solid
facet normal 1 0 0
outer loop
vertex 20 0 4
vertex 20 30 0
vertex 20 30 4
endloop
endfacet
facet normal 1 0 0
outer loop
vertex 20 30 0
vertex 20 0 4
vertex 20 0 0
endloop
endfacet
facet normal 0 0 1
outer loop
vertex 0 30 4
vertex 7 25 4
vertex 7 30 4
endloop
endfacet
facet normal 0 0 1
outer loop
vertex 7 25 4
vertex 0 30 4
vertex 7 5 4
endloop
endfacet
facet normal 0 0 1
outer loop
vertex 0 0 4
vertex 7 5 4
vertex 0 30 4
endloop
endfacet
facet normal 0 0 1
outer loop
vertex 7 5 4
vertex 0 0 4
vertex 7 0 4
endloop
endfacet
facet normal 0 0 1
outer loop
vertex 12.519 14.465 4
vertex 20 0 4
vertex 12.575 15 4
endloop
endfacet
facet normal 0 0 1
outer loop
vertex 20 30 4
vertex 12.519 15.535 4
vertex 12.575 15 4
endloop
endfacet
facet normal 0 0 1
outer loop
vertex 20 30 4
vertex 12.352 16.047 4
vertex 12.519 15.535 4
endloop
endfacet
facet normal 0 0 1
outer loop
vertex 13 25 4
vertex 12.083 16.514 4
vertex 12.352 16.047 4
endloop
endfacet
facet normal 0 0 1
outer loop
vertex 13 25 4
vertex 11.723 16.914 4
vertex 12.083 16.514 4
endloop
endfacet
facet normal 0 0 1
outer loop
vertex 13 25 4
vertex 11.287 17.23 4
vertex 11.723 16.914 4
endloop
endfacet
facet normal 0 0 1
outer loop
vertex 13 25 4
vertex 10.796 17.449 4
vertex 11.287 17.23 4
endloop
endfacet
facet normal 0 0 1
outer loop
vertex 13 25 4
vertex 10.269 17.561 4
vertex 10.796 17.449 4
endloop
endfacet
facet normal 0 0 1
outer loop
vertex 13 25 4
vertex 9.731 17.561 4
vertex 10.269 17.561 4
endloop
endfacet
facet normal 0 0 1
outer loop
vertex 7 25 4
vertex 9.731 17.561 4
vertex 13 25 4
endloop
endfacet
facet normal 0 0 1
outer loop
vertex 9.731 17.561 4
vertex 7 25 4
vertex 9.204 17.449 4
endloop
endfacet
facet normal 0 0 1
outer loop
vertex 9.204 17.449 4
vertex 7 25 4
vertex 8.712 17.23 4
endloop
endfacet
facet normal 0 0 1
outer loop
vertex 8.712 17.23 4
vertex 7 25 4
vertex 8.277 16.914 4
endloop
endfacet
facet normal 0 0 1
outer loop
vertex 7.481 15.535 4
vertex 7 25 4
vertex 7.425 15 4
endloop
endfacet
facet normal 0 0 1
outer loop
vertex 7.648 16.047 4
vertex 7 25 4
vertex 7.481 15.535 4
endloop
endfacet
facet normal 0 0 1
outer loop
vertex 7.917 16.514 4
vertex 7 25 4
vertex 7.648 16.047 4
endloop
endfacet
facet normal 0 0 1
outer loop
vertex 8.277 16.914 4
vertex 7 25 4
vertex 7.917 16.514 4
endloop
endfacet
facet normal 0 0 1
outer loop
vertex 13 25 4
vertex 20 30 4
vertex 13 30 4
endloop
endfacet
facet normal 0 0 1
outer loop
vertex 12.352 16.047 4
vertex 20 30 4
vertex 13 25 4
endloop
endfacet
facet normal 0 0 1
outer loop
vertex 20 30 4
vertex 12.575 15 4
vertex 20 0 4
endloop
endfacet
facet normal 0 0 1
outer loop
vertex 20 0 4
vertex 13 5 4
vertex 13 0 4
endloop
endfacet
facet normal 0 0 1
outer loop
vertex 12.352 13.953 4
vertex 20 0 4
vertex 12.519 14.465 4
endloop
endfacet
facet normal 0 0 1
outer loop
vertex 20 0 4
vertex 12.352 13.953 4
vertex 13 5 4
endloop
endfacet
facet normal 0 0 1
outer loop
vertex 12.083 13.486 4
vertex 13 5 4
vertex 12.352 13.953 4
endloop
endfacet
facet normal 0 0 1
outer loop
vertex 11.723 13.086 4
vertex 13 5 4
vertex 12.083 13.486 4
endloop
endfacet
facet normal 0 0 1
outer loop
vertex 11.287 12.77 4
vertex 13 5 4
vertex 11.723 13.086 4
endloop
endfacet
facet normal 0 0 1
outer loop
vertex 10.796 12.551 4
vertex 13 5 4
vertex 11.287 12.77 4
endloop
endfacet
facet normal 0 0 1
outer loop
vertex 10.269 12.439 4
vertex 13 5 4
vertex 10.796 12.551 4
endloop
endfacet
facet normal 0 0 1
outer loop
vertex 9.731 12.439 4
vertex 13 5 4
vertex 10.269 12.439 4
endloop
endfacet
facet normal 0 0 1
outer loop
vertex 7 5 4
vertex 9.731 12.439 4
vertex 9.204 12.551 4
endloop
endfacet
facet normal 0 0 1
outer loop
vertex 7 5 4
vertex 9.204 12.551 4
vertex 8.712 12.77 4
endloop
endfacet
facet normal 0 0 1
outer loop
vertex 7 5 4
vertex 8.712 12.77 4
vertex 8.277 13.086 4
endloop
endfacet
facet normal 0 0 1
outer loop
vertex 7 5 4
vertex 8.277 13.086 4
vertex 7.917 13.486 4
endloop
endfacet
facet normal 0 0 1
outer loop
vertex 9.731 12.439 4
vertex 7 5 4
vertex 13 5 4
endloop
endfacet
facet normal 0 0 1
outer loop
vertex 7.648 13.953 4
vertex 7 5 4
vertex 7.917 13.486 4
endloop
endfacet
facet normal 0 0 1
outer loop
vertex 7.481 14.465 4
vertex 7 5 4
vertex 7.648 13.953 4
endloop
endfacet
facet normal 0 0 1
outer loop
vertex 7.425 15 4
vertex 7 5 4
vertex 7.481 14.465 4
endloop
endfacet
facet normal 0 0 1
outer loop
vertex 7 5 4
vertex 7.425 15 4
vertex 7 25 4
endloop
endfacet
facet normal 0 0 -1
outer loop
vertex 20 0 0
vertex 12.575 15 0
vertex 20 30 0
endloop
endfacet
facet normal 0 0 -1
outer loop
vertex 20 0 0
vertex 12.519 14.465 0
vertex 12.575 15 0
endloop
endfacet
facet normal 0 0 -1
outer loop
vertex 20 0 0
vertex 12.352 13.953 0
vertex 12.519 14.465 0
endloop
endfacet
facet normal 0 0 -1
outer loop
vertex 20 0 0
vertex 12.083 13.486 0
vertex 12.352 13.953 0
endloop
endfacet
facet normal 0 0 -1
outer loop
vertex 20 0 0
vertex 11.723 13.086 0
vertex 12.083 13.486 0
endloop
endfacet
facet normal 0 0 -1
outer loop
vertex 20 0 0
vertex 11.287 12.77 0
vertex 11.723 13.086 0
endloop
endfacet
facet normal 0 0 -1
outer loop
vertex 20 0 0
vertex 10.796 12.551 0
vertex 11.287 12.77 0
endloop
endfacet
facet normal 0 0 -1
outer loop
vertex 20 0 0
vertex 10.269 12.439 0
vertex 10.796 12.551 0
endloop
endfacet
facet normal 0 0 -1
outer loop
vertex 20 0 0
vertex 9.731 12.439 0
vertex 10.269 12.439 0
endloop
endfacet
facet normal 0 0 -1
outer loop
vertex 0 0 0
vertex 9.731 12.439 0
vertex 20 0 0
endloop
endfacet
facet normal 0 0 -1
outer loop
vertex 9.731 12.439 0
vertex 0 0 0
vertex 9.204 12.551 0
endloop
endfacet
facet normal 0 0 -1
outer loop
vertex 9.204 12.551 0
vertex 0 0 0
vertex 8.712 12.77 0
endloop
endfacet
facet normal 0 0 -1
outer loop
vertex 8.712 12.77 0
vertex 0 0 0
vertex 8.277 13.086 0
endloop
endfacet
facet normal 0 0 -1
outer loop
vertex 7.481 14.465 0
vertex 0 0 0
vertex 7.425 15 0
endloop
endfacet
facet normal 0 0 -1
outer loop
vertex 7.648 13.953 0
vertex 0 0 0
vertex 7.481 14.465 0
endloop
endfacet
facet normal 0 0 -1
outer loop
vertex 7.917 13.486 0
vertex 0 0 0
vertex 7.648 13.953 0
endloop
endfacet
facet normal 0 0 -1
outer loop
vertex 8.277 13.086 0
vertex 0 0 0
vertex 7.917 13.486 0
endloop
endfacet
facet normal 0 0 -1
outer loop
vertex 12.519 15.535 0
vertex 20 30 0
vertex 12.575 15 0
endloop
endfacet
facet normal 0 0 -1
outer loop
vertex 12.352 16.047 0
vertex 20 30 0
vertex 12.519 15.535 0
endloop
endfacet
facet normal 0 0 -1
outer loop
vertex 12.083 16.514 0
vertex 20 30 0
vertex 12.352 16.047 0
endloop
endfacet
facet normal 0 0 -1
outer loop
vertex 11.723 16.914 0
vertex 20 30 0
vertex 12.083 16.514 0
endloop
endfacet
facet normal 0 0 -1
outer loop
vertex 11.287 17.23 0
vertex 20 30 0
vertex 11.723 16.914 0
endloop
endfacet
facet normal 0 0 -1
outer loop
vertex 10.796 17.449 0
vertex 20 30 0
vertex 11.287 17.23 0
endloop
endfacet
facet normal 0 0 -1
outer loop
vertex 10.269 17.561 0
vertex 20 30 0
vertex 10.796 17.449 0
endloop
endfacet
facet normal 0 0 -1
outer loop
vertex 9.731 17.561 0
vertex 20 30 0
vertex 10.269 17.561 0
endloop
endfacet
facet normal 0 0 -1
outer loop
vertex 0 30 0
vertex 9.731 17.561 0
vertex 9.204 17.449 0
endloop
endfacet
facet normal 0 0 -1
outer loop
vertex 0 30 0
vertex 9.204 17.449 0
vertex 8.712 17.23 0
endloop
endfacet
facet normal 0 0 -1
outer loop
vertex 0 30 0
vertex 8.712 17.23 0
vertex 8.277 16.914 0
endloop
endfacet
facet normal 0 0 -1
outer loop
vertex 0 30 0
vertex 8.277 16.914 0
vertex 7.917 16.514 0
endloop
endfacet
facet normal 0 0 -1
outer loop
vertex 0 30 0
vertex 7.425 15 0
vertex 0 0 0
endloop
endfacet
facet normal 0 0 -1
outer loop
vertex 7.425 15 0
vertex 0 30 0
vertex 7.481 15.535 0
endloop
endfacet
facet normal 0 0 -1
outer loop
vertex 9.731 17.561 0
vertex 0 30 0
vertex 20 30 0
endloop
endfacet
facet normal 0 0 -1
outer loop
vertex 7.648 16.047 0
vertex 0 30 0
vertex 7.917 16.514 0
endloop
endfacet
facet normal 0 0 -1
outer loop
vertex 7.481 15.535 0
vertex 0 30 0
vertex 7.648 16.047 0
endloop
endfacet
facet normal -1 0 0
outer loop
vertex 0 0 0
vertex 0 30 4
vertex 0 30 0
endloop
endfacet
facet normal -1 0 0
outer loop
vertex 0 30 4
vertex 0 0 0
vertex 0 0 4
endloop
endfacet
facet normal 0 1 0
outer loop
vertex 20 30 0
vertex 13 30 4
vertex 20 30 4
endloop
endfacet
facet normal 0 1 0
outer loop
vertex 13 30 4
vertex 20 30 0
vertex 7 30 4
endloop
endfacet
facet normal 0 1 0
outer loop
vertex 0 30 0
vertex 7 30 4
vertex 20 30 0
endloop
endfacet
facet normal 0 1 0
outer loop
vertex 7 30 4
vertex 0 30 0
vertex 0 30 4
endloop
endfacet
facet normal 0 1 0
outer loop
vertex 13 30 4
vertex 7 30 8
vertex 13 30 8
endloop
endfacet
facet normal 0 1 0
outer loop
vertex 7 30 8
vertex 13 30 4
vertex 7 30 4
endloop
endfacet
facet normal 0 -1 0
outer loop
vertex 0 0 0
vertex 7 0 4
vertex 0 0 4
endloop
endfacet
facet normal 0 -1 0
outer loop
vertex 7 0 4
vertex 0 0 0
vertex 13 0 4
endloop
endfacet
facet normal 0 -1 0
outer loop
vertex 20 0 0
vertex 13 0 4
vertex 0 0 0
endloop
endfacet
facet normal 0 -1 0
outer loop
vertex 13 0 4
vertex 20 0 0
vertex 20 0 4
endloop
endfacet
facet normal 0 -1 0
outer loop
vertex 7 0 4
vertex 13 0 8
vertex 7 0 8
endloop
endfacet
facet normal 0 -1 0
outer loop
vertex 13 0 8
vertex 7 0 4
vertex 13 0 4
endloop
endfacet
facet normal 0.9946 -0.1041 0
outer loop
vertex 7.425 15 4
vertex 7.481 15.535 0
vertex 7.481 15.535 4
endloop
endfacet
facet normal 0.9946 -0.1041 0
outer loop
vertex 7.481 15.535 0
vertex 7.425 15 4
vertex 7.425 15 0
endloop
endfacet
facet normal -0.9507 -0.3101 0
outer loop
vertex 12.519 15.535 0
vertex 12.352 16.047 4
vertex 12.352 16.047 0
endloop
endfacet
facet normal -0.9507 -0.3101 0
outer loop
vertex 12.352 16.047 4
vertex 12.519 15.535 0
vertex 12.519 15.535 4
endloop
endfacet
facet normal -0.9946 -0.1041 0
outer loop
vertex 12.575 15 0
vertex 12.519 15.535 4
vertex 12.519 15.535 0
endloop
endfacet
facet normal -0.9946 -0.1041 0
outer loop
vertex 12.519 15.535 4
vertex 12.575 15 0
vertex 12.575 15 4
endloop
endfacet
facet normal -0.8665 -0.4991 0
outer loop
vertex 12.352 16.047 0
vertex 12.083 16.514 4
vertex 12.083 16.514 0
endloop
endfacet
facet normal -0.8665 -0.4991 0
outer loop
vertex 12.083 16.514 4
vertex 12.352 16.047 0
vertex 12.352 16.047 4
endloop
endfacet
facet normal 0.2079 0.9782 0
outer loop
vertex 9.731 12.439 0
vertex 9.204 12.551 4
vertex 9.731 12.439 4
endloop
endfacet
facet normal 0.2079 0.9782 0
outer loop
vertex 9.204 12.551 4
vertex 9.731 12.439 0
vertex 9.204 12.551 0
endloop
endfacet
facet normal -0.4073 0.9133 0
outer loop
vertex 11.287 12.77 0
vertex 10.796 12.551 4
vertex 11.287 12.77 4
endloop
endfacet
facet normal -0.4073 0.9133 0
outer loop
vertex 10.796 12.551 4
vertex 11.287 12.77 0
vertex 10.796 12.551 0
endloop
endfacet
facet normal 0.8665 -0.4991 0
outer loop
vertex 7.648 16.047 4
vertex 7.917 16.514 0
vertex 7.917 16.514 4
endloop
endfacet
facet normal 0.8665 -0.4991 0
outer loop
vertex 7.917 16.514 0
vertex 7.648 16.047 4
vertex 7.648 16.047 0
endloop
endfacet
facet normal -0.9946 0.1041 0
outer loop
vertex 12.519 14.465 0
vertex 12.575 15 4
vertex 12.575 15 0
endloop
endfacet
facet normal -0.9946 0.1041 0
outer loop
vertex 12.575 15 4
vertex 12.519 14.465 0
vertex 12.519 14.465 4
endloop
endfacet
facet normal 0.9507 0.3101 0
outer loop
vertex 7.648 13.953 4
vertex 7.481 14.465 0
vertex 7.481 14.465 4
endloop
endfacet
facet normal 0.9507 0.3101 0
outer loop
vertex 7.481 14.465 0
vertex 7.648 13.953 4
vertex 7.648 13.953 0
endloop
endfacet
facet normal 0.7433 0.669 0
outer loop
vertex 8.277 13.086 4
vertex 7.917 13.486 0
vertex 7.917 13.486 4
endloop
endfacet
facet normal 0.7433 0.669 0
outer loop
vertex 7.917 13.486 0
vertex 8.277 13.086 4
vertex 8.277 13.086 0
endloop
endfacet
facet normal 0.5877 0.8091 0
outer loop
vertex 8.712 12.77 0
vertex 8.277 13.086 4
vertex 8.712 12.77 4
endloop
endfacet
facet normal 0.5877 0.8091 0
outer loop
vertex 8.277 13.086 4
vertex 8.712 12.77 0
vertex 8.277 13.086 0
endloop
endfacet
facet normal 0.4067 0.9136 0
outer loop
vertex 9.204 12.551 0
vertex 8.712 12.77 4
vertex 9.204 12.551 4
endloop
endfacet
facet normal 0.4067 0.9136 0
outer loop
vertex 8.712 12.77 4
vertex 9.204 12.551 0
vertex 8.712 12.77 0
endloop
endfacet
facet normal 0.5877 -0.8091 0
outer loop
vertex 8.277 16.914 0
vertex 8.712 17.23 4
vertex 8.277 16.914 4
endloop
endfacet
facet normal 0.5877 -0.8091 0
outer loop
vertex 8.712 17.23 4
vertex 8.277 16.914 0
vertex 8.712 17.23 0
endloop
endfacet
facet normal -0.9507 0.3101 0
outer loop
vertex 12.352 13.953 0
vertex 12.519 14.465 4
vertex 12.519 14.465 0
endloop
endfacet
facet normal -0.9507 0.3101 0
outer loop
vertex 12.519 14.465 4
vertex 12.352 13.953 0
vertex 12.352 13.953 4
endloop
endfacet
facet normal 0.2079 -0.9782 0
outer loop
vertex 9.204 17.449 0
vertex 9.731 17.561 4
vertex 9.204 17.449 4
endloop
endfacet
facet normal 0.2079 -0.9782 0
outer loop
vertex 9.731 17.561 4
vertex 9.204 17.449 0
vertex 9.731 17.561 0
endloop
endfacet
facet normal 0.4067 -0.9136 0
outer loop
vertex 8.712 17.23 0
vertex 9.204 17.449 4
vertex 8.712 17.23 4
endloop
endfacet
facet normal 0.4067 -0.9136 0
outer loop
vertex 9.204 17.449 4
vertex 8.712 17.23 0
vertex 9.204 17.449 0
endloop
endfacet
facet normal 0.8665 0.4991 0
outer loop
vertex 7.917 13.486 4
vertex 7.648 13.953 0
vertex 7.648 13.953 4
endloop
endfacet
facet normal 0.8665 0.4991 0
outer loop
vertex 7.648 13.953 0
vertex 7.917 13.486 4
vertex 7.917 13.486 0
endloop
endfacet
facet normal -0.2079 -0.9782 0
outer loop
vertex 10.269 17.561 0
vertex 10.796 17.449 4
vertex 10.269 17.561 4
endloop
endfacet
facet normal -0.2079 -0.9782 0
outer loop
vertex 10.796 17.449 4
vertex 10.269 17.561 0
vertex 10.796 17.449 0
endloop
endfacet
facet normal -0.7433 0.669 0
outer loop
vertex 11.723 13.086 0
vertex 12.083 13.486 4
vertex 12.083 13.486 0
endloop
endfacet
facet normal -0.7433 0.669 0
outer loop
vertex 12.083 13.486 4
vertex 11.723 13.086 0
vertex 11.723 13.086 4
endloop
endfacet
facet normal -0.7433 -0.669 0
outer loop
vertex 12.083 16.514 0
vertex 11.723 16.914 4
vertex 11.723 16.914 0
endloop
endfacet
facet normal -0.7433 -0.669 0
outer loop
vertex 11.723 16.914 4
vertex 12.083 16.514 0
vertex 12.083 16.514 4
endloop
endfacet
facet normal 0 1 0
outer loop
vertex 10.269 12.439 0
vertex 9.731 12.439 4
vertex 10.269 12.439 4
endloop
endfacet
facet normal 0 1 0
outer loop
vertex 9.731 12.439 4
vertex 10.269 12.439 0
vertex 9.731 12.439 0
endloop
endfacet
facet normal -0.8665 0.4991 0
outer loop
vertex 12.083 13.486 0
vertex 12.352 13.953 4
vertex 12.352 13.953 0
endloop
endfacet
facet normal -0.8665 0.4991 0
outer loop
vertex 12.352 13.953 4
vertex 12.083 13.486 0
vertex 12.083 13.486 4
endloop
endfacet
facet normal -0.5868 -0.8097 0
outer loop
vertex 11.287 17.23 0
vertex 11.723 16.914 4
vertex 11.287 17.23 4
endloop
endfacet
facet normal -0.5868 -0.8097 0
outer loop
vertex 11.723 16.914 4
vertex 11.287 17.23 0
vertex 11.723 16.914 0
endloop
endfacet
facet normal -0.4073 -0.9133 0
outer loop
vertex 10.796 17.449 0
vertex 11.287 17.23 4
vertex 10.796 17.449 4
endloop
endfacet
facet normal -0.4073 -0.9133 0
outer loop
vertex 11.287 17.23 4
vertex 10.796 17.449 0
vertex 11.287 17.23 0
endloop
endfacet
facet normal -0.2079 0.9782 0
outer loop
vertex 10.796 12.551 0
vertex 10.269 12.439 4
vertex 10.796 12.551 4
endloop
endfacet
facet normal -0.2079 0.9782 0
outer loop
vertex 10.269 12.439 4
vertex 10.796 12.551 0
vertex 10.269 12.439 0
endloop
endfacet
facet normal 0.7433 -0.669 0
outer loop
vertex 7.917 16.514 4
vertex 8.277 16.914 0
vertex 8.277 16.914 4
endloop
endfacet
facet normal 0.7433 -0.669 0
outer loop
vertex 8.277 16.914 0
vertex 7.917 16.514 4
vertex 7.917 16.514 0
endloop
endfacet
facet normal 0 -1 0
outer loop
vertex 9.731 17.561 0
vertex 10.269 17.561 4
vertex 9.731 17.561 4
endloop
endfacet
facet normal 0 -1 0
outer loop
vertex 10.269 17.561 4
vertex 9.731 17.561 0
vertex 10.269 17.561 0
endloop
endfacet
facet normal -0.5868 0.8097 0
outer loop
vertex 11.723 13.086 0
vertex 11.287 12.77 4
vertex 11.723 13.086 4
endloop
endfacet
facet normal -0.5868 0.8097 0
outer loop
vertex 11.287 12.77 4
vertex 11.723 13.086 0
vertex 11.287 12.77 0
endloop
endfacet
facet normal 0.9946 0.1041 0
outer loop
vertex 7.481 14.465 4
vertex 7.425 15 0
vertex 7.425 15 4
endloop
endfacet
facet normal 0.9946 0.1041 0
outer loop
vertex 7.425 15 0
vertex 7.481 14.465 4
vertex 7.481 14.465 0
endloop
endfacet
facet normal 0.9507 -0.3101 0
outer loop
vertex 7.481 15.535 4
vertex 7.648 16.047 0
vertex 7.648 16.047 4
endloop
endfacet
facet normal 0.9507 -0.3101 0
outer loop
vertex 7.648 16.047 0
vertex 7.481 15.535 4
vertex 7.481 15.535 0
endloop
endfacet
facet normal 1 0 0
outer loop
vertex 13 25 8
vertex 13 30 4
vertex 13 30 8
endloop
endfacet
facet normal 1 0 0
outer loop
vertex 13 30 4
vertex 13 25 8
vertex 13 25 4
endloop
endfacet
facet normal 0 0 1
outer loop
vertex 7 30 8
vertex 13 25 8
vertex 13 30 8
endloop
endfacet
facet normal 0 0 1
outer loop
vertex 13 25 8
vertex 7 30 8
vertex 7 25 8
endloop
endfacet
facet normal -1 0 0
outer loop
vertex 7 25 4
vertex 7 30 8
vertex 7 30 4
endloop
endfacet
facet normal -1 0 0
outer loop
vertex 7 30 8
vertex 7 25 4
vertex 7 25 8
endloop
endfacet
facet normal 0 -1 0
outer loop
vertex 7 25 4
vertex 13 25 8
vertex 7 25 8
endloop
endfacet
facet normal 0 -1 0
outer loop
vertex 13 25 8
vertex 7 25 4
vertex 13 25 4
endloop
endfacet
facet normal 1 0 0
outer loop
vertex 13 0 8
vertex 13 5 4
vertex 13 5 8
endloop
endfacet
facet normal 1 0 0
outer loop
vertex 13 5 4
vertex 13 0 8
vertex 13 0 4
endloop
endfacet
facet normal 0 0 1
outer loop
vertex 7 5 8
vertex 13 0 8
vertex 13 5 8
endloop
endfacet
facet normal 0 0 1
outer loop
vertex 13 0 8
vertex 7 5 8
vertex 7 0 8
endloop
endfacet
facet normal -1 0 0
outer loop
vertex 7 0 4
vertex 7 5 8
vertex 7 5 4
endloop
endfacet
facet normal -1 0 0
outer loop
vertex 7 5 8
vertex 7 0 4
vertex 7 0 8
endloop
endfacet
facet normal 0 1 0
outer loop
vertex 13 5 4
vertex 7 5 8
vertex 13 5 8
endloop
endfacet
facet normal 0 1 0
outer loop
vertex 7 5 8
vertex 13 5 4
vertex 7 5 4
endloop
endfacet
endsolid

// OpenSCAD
inner=6;
outer=20;
screwhole=5 + 0.15;
height=4;

stock=5;
stockheight=4;

module mount(length=30, holes=1)
{
    difference()
    {
        cube([outer,length,height]);
        
        union()
        {
            for(i=[1:holes])
            {
                translate([outer/2,i*length/(holes+1)])
                    cylinder(d=screwhole,h=height,$fn=30);
            }
            
        }
    }
    
    translate([outer/2-inner/2,length-stock,height])
        cube([inner,stock,stockheight]);
    
    translate([outer/2-inner/2,0,height])
        cube([inner,stock,stockheight]);
    
}



mount();
